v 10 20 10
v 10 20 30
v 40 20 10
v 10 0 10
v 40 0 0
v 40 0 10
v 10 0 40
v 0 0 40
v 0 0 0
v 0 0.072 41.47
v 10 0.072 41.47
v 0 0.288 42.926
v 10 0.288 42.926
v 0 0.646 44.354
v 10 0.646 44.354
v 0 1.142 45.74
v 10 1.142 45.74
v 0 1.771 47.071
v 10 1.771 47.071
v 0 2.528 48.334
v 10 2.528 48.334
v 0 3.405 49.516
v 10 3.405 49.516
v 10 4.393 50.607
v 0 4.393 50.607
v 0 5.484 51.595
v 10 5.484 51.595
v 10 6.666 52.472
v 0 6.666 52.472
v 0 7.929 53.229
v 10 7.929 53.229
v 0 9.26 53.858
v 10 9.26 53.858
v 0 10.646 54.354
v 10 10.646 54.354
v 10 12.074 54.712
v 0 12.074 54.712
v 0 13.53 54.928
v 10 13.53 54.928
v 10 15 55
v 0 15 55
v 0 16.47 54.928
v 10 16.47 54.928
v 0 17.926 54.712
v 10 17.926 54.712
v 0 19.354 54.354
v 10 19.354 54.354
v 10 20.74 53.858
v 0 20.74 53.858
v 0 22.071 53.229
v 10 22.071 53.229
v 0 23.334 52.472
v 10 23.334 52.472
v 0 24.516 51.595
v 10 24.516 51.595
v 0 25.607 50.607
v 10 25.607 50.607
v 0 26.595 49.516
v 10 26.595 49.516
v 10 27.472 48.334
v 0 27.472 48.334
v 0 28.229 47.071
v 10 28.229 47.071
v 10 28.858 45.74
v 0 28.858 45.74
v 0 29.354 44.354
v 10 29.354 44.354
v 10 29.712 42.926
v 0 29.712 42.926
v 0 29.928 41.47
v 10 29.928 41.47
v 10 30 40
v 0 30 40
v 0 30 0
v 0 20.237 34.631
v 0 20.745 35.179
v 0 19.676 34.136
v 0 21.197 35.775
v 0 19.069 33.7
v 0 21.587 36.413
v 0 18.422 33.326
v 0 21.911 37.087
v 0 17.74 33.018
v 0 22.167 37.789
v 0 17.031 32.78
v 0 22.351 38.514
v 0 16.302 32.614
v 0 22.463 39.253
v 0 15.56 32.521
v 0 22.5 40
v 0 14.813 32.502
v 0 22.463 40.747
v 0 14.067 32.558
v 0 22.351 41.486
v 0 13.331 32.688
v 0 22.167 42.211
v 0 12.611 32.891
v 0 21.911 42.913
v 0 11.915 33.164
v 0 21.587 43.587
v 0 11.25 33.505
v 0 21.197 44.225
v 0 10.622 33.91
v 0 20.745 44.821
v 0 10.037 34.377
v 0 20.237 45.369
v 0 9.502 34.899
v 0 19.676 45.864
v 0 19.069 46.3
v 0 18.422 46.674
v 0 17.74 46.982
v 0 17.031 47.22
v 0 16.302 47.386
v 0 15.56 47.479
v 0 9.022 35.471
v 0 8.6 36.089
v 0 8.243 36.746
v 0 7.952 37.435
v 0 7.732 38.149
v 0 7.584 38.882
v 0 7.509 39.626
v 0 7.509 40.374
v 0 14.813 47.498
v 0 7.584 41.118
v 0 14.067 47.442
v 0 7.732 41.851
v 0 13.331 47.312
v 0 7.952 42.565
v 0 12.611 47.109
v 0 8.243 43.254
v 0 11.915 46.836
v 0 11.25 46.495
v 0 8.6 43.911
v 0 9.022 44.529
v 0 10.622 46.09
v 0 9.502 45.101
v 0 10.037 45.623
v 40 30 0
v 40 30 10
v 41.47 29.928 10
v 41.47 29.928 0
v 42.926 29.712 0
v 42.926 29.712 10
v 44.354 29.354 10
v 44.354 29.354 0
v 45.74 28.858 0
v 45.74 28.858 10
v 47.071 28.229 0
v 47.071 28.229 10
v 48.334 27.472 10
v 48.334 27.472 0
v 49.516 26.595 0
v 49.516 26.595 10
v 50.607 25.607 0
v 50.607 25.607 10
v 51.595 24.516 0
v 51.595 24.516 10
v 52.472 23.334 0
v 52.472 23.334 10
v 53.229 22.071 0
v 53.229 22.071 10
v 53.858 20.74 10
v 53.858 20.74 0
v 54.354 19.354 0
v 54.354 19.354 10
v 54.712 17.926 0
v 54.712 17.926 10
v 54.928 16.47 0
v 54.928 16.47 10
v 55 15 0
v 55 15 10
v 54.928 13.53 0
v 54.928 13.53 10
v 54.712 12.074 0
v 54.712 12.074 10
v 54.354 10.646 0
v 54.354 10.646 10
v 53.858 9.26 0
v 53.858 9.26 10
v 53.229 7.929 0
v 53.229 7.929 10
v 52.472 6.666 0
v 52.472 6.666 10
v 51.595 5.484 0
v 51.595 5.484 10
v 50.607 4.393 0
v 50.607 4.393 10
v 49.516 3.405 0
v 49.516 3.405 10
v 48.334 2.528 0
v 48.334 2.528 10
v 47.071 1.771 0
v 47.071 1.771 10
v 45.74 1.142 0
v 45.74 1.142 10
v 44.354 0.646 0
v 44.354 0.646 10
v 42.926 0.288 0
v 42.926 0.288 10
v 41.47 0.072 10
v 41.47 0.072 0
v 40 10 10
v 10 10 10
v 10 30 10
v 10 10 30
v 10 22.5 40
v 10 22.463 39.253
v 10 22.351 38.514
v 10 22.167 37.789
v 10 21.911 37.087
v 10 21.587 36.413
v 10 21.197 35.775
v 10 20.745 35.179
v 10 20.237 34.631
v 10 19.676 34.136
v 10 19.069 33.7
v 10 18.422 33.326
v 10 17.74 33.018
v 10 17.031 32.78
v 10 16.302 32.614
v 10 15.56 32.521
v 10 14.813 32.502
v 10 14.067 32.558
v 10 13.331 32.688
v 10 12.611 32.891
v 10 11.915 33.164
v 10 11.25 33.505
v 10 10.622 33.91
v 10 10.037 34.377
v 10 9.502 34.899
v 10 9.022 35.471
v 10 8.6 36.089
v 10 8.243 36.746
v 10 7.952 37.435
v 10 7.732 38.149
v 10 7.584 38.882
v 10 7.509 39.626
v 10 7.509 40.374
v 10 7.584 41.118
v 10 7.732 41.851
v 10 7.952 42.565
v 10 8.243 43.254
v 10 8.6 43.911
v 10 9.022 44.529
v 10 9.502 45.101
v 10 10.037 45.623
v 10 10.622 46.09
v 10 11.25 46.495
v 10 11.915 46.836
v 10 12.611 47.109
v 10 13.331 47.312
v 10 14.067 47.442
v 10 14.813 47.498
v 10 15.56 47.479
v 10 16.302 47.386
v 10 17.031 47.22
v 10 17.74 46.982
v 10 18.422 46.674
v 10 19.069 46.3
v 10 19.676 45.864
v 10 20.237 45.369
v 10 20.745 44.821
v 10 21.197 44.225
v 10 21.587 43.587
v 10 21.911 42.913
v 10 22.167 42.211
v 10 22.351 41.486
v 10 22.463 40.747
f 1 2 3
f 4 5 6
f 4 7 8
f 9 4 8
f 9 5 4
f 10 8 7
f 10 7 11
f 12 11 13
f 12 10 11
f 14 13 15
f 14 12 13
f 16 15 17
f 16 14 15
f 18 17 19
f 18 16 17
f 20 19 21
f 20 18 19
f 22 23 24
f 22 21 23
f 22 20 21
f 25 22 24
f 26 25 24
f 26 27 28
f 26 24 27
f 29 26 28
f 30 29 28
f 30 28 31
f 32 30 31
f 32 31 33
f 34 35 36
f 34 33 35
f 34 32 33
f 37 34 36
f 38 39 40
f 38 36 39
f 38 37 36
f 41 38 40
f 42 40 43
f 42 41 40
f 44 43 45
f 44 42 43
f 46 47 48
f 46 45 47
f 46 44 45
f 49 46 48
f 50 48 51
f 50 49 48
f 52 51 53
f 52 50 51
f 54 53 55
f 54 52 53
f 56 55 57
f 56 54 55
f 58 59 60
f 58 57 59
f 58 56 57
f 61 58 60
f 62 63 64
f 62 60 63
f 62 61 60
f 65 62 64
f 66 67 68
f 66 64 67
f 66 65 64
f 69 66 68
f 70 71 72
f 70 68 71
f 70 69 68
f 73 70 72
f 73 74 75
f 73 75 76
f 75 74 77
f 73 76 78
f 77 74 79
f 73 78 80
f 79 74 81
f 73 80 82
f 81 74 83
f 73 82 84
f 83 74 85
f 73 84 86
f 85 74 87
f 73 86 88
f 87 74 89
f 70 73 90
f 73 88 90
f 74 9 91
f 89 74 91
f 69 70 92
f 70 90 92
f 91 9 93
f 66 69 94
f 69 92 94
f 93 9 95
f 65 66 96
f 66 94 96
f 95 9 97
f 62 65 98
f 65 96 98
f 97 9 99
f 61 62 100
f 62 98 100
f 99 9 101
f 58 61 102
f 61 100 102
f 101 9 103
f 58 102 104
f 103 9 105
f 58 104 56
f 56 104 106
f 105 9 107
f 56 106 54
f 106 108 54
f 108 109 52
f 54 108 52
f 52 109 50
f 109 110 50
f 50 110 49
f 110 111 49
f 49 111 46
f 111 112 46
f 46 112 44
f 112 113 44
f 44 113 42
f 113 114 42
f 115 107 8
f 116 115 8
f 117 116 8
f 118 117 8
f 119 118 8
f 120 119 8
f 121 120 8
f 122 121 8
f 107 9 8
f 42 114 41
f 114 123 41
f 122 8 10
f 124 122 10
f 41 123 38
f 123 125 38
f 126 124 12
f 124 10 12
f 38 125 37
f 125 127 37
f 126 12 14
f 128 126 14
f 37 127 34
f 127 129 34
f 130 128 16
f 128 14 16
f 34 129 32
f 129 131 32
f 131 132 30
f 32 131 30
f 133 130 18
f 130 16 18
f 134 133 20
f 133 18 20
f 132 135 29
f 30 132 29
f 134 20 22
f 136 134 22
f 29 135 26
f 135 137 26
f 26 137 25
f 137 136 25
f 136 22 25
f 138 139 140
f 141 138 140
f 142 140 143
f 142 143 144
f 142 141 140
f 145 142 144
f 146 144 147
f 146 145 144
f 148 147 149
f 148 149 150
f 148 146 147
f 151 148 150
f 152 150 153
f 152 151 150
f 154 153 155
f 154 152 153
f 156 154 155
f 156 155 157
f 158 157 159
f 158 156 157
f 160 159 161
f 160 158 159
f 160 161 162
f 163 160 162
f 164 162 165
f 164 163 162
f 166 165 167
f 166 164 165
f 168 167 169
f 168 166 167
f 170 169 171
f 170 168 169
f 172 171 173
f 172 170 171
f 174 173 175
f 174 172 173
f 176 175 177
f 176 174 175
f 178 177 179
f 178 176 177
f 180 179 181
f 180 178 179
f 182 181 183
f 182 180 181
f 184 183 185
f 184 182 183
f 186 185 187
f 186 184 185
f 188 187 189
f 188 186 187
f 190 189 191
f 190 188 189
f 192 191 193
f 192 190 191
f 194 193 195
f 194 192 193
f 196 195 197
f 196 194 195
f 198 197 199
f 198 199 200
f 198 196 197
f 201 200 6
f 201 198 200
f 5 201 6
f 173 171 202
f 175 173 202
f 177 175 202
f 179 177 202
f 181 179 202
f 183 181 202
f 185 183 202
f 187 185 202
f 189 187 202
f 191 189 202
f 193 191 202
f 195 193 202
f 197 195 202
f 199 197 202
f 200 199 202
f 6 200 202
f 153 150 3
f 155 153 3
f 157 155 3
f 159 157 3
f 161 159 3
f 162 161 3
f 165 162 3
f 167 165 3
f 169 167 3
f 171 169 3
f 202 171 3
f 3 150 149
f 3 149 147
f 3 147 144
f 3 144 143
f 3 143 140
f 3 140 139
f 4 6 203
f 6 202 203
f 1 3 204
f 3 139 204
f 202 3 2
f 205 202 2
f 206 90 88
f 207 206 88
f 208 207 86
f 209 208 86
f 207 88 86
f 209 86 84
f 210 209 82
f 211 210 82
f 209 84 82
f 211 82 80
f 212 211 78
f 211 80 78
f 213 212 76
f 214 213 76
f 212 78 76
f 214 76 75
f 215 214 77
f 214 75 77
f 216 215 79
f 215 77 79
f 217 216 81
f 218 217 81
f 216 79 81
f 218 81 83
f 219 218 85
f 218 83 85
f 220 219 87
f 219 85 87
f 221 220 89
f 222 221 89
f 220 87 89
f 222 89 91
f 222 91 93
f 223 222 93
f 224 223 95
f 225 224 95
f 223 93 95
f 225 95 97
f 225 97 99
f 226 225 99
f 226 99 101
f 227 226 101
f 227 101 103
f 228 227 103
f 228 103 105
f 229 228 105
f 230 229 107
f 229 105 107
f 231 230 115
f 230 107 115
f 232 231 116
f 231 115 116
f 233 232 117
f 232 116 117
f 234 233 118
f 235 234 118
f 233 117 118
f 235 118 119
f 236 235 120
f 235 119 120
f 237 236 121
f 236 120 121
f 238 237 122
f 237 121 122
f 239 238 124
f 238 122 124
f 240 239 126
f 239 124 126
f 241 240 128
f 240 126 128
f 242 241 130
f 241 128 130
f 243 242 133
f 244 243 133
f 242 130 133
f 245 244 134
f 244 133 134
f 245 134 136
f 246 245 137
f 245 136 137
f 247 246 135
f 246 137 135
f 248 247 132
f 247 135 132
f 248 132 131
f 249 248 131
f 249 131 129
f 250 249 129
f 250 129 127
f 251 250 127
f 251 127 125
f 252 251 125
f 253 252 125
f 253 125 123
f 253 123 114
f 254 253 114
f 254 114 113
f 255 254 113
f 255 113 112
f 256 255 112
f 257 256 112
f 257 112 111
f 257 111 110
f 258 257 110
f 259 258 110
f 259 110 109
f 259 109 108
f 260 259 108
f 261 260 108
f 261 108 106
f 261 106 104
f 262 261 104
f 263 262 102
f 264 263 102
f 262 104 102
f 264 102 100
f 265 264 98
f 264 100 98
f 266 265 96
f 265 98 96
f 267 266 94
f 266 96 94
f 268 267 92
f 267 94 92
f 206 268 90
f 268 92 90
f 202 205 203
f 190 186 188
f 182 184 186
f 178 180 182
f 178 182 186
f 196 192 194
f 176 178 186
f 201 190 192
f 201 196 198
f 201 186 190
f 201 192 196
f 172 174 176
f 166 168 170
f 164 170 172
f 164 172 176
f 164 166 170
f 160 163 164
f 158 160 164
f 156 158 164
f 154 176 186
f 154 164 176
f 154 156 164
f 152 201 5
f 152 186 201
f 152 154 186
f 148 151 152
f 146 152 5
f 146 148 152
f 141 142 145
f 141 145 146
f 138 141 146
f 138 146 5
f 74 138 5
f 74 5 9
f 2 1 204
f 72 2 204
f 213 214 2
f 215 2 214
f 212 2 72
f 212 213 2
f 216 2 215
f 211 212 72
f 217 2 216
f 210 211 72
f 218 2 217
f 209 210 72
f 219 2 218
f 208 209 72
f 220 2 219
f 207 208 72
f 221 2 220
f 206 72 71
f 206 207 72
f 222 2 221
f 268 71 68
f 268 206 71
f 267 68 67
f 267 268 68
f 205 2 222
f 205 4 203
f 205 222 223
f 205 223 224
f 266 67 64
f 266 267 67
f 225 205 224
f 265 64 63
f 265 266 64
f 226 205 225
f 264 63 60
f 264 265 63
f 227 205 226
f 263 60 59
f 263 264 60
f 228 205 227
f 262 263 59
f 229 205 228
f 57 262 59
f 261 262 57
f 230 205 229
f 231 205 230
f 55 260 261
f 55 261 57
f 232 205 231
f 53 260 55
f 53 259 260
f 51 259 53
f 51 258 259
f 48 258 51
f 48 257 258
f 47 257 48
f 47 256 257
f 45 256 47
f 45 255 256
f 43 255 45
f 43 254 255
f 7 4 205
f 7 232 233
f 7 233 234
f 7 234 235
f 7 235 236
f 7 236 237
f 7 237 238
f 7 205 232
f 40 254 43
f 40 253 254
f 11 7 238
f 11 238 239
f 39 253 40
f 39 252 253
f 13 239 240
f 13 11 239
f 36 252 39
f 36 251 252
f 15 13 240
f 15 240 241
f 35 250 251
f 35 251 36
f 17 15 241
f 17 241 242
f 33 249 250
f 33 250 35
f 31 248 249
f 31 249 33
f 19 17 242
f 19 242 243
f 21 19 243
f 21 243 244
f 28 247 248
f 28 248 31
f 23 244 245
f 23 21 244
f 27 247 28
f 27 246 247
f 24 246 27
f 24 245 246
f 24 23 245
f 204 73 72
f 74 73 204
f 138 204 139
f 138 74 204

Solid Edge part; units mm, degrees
sketch "Sketch1" plane through (0, 0, 0) normal (0, 0, 1) x (1, 0, 0)
  line L0 (40, 0) -> (0, 0)
  line L1 (0, 0) -> (0, 30)
  line L2 (0, 30) -> (40, 30)
  arc A0 (40, 30) -> (40, 0) centre (40, 15) cw
extrude "Protrusion1" add sketch "Sketch1" along normal blind 10
sketch "Sketch2" plane through (0, 15, 5) normal (-1, 0, 0) x (0, 1, 0)
  line L0 (-15, -35) -> (-15, 5)
  line L1 (-15, 5) -> (15, 5)
  line L2 (15, 5) -> (15, -35)
  arc A0 (15, -35) -> (-15, -35) centre (0, -35) cw
  circle A1 centre (0, -35) radius 7.5
extrude "ExtrudedCutout_2" cut sketch "Sketch2" against normal blind 10
sketch "Sketch3" plane through (0, 15, 5) normal (-1, 0, 0) x (0, 1, 0)
  line L0 (-15, -35) -> (-15, 5)
  line L1 (-15, 5) -> (15, 5)
  line L2 (15, 5) -> (15, -35)
  arc A0 (15, -35) -> (-15, -35) centre (0, -35) cw
  circle A1 centre (0, -35) radius 7.5
extrude "ExtrudedProtrusion_3" add sketch "Sketch3" against normal blind 10
sketch "Sketch4" plane through (0, 15, 0) normal (0, -1, 0) x (1, 0, 0)
  line L0 (40, 10) -> (10, 30)
  line L1 (10, 10) -> (10, 30)
  line L2 (10, 10) -> (40, 10)
extrude "ExtrudedProtrusion_8" add sketch "Sketch4" along normal mid plane 10
